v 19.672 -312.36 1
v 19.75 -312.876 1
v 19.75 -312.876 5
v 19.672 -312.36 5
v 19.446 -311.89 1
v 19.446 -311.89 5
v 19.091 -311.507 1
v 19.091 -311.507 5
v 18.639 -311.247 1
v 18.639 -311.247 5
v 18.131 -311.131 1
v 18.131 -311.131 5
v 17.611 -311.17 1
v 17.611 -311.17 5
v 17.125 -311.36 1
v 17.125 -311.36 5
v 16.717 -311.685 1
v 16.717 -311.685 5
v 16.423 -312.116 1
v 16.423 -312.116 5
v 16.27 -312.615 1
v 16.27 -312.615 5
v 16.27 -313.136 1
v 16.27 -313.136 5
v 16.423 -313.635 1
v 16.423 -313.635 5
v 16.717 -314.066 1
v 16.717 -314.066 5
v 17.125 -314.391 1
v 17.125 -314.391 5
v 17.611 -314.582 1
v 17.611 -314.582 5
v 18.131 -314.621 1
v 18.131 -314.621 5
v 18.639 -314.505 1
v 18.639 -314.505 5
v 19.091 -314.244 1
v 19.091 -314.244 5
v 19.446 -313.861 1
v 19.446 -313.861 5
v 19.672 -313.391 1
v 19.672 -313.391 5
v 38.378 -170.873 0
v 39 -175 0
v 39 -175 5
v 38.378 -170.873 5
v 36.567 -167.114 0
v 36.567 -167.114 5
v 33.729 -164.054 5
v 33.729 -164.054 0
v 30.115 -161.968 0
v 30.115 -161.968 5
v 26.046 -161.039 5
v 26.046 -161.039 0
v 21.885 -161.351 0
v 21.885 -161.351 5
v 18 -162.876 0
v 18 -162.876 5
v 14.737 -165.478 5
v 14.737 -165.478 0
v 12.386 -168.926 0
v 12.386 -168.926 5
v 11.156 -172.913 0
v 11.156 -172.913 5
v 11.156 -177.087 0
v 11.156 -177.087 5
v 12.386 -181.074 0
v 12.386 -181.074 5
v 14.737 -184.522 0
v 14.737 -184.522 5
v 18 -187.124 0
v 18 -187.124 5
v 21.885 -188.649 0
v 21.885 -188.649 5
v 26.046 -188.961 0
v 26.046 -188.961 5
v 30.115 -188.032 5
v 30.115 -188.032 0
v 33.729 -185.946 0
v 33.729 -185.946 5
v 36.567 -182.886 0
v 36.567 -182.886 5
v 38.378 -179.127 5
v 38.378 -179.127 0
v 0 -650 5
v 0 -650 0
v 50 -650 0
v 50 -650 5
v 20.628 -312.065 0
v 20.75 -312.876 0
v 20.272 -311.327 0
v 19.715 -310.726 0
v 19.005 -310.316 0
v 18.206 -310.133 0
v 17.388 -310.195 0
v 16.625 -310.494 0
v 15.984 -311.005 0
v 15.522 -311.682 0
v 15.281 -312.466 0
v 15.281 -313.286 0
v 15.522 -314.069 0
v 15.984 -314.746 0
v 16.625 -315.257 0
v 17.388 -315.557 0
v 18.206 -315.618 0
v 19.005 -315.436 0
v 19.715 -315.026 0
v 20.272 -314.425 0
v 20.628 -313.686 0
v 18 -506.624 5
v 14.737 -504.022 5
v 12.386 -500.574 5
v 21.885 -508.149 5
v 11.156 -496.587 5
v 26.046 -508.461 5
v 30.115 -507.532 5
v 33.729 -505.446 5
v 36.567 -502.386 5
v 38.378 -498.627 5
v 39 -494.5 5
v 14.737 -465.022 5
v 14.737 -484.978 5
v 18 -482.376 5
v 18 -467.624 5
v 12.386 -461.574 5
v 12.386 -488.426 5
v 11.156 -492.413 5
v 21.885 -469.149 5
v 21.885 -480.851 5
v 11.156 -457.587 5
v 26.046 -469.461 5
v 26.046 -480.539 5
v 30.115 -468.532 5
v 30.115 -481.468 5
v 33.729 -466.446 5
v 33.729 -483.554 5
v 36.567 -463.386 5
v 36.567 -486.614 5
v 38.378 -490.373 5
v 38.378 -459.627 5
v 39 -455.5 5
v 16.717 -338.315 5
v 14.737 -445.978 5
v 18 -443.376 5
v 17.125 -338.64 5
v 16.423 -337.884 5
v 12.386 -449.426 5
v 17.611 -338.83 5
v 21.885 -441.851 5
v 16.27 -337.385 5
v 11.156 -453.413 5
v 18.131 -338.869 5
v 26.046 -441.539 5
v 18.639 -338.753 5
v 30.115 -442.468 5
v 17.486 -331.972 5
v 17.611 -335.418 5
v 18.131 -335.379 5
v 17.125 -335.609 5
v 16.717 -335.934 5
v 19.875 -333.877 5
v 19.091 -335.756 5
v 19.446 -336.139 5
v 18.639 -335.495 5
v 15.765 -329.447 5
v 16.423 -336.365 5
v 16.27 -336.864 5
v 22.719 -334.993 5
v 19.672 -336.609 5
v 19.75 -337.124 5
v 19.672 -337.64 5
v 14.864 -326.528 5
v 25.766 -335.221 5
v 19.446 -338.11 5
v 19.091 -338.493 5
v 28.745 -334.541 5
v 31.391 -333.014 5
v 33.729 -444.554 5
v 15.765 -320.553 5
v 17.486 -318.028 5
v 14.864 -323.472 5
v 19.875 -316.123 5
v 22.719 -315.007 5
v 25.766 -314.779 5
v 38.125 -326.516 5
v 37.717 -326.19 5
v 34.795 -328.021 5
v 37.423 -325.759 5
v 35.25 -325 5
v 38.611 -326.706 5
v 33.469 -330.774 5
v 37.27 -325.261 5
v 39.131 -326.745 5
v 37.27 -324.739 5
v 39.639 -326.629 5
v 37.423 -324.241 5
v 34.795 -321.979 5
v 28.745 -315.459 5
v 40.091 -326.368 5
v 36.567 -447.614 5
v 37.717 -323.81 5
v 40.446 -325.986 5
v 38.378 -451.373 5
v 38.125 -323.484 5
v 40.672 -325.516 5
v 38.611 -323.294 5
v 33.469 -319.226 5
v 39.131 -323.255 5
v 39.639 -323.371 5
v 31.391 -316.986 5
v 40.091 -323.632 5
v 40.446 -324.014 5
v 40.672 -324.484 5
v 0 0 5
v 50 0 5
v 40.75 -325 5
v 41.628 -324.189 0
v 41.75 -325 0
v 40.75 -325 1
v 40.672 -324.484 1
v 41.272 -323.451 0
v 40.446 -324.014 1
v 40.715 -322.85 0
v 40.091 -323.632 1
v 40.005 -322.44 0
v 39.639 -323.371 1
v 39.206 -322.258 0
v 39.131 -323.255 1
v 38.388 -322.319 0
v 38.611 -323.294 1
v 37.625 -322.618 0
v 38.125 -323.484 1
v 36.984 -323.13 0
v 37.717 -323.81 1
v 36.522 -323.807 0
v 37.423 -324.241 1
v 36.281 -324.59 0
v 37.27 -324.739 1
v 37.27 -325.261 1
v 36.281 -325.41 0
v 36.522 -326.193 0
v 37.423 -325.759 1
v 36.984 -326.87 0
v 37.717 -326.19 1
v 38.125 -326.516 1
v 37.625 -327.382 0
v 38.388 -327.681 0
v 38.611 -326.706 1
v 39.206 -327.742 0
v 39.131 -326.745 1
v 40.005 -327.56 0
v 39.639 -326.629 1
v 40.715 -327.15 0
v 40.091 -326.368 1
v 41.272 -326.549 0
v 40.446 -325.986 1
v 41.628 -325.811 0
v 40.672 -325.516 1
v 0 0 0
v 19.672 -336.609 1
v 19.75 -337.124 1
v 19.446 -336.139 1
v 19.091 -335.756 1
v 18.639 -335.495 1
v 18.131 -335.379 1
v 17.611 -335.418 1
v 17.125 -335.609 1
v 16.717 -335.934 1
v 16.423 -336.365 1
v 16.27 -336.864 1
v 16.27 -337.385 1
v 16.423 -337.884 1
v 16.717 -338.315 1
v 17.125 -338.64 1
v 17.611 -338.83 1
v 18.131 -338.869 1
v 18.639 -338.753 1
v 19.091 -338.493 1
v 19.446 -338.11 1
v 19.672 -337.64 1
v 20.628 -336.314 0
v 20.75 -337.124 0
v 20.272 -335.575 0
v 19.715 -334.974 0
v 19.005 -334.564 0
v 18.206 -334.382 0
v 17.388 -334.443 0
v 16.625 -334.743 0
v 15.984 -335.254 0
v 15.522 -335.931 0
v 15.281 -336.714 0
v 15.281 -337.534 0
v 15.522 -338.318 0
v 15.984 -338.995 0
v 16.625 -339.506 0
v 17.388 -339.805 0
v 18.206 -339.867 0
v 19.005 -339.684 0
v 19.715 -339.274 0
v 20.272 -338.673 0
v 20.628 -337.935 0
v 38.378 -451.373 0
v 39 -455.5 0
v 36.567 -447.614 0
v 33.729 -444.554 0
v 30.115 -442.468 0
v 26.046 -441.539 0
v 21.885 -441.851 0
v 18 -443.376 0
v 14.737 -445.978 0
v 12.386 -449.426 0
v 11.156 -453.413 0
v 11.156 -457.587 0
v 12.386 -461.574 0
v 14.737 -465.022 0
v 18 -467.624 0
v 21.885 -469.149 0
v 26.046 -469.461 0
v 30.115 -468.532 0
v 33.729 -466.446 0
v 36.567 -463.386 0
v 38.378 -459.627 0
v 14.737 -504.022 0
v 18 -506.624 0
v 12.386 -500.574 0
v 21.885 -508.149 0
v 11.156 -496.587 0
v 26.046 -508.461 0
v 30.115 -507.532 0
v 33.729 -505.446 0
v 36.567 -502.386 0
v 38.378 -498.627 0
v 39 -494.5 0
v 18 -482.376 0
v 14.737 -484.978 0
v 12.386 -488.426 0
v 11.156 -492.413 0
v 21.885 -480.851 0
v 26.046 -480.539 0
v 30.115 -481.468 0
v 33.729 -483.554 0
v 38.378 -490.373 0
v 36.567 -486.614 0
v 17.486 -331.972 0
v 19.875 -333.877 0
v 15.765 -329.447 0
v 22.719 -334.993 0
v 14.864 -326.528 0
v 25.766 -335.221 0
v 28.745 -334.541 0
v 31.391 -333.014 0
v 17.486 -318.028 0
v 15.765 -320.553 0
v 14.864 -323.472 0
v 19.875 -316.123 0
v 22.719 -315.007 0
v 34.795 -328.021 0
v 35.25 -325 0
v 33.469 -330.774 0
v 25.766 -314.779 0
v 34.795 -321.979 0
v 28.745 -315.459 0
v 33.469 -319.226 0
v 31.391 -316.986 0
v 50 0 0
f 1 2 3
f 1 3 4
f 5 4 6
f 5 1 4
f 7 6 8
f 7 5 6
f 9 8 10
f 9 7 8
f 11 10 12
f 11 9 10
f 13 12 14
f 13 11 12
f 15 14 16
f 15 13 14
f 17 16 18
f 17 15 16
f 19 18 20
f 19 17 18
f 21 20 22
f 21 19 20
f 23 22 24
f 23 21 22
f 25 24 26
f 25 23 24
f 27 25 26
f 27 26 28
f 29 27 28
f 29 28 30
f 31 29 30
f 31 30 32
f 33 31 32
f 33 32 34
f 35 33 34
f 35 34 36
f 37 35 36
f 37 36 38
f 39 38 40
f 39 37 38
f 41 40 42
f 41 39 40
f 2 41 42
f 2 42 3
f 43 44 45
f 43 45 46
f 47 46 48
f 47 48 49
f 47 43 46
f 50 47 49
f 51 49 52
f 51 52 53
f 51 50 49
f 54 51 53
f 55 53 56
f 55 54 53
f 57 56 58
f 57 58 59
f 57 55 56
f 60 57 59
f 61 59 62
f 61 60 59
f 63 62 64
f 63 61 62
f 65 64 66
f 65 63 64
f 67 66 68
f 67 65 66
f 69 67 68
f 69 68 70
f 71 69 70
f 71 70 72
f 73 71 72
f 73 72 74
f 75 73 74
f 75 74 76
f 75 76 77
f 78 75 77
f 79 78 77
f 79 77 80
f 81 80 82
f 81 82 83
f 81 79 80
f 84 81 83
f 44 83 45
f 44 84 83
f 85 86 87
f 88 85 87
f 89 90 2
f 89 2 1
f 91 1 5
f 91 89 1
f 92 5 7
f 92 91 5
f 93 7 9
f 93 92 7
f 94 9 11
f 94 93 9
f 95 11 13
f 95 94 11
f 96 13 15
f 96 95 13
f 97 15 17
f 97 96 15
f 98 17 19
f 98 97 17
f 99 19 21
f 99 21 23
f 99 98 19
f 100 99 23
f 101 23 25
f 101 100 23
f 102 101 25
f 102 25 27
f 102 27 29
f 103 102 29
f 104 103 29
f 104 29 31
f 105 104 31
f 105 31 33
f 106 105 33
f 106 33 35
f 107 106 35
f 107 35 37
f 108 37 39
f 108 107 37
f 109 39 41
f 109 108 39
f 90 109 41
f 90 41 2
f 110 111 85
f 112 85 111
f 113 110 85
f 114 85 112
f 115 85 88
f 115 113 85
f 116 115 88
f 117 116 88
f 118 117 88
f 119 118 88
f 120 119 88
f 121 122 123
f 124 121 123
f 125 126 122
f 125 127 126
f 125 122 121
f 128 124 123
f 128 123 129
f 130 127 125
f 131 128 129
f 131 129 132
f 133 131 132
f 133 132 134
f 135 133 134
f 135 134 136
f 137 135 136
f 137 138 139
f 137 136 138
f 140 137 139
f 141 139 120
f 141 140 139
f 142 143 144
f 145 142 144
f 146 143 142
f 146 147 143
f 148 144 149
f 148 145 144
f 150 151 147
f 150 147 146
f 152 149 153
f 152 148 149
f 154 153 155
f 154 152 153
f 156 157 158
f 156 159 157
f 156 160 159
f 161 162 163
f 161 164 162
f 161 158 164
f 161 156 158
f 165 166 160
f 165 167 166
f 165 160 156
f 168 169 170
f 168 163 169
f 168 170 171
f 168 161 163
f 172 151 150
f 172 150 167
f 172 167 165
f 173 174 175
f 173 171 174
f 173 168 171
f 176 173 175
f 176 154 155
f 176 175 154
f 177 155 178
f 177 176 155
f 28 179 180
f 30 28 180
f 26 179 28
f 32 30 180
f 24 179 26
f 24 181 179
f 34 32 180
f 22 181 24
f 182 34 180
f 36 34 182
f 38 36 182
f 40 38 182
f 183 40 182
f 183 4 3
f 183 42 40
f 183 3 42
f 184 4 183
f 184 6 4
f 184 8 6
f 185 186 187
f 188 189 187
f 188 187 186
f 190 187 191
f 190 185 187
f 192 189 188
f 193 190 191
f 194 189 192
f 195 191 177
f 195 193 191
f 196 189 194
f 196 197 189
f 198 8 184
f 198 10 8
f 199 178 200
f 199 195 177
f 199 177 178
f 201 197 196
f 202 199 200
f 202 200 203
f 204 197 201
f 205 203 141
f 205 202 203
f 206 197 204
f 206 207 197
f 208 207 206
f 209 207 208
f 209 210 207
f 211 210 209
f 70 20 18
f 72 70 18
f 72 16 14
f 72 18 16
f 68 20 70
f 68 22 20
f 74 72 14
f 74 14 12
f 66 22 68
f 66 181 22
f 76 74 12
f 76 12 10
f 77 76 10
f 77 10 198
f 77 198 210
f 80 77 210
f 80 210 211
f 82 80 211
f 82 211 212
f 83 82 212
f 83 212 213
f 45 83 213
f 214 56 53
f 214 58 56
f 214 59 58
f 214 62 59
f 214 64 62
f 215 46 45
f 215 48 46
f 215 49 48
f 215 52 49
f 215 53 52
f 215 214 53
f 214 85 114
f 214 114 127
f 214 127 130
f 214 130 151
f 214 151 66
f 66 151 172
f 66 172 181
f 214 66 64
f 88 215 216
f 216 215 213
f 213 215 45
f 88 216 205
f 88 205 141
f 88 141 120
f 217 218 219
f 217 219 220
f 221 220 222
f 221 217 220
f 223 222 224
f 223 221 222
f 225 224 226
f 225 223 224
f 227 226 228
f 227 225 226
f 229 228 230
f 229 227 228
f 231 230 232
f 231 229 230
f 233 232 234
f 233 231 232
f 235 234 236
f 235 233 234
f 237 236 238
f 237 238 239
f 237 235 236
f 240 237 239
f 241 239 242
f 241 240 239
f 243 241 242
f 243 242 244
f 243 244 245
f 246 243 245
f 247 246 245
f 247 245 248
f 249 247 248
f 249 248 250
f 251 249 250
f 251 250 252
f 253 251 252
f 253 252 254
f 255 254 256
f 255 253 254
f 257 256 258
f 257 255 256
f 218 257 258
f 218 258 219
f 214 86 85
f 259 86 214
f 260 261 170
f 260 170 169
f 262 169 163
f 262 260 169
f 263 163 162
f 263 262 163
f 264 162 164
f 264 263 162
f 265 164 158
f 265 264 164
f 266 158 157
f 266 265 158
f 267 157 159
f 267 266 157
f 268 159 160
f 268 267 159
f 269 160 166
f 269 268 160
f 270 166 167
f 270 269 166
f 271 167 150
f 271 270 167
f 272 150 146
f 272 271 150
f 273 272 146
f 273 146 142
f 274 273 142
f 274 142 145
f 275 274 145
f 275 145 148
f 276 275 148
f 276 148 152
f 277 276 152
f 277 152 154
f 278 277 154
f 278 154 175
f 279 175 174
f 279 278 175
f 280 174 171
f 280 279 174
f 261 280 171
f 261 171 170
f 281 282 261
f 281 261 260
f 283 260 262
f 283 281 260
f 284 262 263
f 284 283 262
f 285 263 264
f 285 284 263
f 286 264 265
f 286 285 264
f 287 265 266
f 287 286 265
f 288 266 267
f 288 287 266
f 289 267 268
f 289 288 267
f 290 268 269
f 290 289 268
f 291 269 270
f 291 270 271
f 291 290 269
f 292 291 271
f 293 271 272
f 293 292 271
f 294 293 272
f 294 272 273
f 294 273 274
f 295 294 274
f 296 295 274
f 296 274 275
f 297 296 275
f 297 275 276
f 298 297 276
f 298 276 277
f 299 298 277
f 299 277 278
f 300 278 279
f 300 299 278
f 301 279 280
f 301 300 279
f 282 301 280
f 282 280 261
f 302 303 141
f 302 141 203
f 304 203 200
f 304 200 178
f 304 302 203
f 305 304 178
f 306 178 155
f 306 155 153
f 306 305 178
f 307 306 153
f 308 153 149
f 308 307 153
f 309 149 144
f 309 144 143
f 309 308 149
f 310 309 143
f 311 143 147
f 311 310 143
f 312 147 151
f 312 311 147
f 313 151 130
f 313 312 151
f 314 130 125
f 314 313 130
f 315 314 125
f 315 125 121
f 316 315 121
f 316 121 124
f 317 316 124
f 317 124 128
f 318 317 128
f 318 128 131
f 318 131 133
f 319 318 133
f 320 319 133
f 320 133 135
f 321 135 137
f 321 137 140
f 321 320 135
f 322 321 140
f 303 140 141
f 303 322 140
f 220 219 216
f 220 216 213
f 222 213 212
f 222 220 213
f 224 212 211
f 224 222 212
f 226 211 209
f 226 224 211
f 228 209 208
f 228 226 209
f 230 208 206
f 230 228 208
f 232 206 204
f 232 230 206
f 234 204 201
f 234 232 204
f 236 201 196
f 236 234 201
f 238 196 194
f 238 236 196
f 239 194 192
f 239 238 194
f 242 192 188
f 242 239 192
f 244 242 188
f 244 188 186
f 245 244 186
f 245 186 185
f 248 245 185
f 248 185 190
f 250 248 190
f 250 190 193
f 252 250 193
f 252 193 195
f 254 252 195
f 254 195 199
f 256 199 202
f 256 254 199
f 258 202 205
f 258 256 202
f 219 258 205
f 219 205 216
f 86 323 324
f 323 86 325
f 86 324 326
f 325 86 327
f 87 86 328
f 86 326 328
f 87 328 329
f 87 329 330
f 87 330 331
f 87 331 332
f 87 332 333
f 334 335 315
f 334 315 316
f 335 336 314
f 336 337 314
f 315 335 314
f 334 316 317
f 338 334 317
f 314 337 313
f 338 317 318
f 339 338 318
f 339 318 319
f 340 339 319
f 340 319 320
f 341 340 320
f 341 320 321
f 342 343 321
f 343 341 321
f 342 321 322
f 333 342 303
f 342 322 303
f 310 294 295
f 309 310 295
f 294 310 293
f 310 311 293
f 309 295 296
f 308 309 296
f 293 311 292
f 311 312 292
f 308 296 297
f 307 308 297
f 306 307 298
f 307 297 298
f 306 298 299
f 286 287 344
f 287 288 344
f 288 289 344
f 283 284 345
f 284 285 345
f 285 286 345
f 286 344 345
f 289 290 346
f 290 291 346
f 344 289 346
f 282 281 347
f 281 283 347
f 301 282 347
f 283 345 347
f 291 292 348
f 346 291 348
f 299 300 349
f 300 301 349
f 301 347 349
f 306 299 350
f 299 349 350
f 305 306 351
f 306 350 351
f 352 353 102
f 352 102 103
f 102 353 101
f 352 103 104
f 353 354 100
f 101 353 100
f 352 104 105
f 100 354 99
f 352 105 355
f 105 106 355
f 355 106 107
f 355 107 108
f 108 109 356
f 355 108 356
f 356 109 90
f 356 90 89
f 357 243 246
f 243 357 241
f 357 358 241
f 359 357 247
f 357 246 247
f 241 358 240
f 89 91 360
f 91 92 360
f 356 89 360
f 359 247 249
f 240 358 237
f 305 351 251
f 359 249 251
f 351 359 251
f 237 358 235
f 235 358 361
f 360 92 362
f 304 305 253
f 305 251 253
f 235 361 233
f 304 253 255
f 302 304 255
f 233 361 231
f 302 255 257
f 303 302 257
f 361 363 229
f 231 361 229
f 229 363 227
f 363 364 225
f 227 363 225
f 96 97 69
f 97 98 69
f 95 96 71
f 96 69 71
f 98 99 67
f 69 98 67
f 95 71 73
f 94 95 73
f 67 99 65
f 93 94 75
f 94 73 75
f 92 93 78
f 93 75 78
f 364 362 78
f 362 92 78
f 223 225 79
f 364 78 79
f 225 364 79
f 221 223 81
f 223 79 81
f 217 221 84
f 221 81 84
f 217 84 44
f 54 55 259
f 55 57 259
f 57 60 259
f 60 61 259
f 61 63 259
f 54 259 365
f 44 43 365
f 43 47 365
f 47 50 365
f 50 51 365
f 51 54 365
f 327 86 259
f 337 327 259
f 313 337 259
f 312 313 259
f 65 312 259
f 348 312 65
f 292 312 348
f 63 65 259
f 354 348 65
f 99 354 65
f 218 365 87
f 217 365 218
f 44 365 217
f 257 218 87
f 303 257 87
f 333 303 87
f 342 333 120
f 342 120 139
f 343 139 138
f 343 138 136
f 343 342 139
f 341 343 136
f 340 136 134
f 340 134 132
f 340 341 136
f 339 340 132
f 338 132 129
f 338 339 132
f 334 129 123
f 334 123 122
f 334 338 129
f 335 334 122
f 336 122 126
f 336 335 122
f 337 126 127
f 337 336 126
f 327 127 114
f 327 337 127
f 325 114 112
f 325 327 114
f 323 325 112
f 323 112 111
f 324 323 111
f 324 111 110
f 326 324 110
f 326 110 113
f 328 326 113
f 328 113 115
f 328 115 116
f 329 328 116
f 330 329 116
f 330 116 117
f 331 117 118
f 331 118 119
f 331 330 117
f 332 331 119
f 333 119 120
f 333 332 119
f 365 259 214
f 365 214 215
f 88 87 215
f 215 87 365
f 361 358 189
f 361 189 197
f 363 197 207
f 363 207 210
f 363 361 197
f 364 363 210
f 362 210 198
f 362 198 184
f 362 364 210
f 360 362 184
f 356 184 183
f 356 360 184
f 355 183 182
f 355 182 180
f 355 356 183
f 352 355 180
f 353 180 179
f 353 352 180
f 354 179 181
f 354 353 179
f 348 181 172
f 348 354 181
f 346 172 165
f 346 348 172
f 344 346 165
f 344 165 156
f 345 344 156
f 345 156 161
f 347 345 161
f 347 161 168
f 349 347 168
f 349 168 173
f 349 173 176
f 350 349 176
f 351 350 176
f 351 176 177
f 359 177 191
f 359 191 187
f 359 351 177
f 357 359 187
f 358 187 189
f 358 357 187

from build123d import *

# Parameters (mm, degrees)
ESQUISSE1_W        = 50
ESQUISSE1_H        = 650
ESQUISSE1_R        = 10.25
ESQUISSE1_R_2      = 14
ESQUISSE1_R_3      = 1.75
BOSS_EXTRU_1_DEPTH = 5
CHANFREIN1_SIZE    = 1


with BuildPart() as part:
    # Esquisse1 → Boss.-Extru.1 (new body)
    with BuildSketch(Plane.XY):
        with Locations((25, -325)):
            Rectangle(ESQUISSE1_W, ESQUISSE1_H)
        with Locations((25, -325)):
            Circle(ESQUISSE1_R, mode=Mode.SUBTRACT)
        with Locations((25, -494.5)):
            Circle(ESQUISSE1_R_2, mode=Mode.SUBTRACT)
        with Locations((18, -312.875644347)):
            Circle(ESQUISSE1_R_3, mode=Mode.SUBTRACT)
        with Locations((18, -337.124355653)):
            Circle(ESQUISSE1_R_3, mode=Mode.SUBTRACT)
        with Locations((39, -325)):
            Circle(ESQUISSE1_R_3, mode=Mode.SUBTRACT)
        with Locations((25, -455.5)):
            Circle(ESQUISSE1_R_2, mode=Mode.SUBTRACT)
        with Locations((25, -175)):
            Circle(ESQUISSE1_R_2, mode=Mode.SUBTRACT)
    extrude(amount=BOSS_EXTRU_1_DEPTH)

    # Chanfrein1
    chanfrein1_edges = [part.edges().sort_by_distance(p)[0] for p in [
        (16.25, -312.875644347, 0),
        (37.25, -325, 0),
        (16.25, -337.124355653, 0),
    ]]
    chamfer(chanfrein1_edges, length=CHANFREIN1_SIZE)


solid = part.part
